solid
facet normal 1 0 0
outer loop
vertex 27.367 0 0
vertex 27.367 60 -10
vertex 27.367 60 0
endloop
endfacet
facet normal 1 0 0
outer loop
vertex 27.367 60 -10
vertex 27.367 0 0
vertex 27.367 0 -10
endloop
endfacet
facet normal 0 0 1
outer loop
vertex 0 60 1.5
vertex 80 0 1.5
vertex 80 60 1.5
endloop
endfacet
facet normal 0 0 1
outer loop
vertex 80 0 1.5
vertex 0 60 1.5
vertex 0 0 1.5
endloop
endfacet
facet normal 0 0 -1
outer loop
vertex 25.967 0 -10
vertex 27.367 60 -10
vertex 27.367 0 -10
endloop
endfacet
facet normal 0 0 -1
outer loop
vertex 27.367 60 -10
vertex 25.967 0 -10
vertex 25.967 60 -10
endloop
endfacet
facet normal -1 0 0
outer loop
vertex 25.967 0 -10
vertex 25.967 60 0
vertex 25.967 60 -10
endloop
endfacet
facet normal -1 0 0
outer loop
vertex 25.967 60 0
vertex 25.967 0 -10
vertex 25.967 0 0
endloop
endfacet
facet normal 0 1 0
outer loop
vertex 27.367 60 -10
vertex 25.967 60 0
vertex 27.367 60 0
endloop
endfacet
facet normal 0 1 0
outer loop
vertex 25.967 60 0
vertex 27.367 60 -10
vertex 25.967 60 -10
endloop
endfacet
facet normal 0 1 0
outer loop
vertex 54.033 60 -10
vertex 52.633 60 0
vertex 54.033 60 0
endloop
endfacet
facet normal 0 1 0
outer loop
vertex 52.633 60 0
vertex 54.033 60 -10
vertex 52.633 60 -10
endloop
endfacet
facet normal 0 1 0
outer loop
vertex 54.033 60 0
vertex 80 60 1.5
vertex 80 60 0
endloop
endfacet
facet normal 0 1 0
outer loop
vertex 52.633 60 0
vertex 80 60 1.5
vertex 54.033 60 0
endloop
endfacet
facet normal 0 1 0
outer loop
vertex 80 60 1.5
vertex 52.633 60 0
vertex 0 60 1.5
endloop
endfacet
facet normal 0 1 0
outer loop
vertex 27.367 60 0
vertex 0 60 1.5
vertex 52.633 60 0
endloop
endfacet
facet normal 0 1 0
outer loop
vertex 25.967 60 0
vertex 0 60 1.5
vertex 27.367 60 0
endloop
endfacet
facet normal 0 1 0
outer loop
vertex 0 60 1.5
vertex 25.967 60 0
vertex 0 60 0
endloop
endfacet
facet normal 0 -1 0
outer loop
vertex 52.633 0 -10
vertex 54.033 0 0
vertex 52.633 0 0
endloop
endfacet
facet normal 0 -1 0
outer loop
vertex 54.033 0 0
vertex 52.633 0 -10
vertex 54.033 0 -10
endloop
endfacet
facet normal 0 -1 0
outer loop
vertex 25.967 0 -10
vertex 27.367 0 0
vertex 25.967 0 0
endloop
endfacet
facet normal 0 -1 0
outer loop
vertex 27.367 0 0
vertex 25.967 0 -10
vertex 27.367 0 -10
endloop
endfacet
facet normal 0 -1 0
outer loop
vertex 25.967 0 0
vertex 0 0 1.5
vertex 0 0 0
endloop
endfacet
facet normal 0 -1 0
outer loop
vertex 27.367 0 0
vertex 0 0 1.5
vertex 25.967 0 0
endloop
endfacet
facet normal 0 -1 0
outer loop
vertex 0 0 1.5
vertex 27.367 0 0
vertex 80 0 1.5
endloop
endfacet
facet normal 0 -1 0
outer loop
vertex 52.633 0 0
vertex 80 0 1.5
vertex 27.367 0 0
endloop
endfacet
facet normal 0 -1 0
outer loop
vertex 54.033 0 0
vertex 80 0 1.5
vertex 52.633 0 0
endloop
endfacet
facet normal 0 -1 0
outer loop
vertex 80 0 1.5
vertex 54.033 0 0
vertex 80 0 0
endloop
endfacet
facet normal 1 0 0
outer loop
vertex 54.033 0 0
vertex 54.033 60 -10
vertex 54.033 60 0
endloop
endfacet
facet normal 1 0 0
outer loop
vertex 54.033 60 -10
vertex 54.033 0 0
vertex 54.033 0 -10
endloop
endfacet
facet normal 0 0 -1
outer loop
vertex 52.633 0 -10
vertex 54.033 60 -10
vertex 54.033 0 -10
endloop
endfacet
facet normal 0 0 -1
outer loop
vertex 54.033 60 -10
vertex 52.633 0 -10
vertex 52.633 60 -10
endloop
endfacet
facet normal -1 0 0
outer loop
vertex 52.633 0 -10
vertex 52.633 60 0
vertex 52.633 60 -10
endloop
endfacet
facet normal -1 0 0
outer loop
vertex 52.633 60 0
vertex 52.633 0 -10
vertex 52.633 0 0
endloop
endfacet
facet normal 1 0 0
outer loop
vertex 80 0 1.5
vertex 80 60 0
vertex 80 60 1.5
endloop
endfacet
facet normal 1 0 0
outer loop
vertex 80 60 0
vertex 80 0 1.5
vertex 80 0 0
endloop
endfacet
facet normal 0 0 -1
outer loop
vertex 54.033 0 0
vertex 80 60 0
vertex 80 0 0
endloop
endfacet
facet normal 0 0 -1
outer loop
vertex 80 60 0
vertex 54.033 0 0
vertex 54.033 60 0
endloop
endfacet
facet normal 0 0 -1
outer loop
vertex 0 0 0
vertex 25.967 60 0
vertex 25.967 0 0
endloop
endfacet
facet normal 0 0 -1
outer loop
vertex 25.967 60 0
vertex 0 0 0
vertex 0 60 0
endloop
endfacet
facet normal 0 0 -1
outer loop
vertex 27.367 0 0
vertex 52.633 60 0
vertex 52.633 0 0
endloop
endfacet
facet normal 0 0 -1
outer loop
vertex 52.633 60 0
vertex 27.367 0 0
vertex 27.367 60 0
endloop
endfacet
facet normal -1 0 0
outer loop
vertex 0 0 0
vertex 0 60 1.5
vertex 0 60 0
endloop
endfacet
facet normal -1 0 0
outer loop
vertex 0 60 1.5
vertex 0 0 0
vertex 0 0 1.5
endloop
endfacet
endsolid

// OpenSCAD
$fn = 32;

// ----------------------------------------------------------------------
// Ribbed panel: 1.5 mm panel
// ----------------------------------------------------------------------

// --- parameters (mm) ---
panel_l = 80;             // panel length, X
panel_w = 60;             // panel width, Y
panel_t = 1.5;            // panel thickness, Z
rib_t = 1.4;              // rib thickness
rib_h = 10;               // rib height below the panel
ribs = 2;                 // number of ribs
fit_tol = 0.05;           // tolerance for press fits, mm
free_tol = 0.2;           // tolerance for clearance fits, mm

total_h = panel_t + rib_h;  // overall height

union() {
  cube([panel_l, panel_w, panel_t]);
  for (i = [1 : ribs])
    translate([i * panel_l / (ribs + 1) - rib_t / 2, 0, -rib_h])
      cube([rib_t, panel_w, rib_h + panel_t]);
}
